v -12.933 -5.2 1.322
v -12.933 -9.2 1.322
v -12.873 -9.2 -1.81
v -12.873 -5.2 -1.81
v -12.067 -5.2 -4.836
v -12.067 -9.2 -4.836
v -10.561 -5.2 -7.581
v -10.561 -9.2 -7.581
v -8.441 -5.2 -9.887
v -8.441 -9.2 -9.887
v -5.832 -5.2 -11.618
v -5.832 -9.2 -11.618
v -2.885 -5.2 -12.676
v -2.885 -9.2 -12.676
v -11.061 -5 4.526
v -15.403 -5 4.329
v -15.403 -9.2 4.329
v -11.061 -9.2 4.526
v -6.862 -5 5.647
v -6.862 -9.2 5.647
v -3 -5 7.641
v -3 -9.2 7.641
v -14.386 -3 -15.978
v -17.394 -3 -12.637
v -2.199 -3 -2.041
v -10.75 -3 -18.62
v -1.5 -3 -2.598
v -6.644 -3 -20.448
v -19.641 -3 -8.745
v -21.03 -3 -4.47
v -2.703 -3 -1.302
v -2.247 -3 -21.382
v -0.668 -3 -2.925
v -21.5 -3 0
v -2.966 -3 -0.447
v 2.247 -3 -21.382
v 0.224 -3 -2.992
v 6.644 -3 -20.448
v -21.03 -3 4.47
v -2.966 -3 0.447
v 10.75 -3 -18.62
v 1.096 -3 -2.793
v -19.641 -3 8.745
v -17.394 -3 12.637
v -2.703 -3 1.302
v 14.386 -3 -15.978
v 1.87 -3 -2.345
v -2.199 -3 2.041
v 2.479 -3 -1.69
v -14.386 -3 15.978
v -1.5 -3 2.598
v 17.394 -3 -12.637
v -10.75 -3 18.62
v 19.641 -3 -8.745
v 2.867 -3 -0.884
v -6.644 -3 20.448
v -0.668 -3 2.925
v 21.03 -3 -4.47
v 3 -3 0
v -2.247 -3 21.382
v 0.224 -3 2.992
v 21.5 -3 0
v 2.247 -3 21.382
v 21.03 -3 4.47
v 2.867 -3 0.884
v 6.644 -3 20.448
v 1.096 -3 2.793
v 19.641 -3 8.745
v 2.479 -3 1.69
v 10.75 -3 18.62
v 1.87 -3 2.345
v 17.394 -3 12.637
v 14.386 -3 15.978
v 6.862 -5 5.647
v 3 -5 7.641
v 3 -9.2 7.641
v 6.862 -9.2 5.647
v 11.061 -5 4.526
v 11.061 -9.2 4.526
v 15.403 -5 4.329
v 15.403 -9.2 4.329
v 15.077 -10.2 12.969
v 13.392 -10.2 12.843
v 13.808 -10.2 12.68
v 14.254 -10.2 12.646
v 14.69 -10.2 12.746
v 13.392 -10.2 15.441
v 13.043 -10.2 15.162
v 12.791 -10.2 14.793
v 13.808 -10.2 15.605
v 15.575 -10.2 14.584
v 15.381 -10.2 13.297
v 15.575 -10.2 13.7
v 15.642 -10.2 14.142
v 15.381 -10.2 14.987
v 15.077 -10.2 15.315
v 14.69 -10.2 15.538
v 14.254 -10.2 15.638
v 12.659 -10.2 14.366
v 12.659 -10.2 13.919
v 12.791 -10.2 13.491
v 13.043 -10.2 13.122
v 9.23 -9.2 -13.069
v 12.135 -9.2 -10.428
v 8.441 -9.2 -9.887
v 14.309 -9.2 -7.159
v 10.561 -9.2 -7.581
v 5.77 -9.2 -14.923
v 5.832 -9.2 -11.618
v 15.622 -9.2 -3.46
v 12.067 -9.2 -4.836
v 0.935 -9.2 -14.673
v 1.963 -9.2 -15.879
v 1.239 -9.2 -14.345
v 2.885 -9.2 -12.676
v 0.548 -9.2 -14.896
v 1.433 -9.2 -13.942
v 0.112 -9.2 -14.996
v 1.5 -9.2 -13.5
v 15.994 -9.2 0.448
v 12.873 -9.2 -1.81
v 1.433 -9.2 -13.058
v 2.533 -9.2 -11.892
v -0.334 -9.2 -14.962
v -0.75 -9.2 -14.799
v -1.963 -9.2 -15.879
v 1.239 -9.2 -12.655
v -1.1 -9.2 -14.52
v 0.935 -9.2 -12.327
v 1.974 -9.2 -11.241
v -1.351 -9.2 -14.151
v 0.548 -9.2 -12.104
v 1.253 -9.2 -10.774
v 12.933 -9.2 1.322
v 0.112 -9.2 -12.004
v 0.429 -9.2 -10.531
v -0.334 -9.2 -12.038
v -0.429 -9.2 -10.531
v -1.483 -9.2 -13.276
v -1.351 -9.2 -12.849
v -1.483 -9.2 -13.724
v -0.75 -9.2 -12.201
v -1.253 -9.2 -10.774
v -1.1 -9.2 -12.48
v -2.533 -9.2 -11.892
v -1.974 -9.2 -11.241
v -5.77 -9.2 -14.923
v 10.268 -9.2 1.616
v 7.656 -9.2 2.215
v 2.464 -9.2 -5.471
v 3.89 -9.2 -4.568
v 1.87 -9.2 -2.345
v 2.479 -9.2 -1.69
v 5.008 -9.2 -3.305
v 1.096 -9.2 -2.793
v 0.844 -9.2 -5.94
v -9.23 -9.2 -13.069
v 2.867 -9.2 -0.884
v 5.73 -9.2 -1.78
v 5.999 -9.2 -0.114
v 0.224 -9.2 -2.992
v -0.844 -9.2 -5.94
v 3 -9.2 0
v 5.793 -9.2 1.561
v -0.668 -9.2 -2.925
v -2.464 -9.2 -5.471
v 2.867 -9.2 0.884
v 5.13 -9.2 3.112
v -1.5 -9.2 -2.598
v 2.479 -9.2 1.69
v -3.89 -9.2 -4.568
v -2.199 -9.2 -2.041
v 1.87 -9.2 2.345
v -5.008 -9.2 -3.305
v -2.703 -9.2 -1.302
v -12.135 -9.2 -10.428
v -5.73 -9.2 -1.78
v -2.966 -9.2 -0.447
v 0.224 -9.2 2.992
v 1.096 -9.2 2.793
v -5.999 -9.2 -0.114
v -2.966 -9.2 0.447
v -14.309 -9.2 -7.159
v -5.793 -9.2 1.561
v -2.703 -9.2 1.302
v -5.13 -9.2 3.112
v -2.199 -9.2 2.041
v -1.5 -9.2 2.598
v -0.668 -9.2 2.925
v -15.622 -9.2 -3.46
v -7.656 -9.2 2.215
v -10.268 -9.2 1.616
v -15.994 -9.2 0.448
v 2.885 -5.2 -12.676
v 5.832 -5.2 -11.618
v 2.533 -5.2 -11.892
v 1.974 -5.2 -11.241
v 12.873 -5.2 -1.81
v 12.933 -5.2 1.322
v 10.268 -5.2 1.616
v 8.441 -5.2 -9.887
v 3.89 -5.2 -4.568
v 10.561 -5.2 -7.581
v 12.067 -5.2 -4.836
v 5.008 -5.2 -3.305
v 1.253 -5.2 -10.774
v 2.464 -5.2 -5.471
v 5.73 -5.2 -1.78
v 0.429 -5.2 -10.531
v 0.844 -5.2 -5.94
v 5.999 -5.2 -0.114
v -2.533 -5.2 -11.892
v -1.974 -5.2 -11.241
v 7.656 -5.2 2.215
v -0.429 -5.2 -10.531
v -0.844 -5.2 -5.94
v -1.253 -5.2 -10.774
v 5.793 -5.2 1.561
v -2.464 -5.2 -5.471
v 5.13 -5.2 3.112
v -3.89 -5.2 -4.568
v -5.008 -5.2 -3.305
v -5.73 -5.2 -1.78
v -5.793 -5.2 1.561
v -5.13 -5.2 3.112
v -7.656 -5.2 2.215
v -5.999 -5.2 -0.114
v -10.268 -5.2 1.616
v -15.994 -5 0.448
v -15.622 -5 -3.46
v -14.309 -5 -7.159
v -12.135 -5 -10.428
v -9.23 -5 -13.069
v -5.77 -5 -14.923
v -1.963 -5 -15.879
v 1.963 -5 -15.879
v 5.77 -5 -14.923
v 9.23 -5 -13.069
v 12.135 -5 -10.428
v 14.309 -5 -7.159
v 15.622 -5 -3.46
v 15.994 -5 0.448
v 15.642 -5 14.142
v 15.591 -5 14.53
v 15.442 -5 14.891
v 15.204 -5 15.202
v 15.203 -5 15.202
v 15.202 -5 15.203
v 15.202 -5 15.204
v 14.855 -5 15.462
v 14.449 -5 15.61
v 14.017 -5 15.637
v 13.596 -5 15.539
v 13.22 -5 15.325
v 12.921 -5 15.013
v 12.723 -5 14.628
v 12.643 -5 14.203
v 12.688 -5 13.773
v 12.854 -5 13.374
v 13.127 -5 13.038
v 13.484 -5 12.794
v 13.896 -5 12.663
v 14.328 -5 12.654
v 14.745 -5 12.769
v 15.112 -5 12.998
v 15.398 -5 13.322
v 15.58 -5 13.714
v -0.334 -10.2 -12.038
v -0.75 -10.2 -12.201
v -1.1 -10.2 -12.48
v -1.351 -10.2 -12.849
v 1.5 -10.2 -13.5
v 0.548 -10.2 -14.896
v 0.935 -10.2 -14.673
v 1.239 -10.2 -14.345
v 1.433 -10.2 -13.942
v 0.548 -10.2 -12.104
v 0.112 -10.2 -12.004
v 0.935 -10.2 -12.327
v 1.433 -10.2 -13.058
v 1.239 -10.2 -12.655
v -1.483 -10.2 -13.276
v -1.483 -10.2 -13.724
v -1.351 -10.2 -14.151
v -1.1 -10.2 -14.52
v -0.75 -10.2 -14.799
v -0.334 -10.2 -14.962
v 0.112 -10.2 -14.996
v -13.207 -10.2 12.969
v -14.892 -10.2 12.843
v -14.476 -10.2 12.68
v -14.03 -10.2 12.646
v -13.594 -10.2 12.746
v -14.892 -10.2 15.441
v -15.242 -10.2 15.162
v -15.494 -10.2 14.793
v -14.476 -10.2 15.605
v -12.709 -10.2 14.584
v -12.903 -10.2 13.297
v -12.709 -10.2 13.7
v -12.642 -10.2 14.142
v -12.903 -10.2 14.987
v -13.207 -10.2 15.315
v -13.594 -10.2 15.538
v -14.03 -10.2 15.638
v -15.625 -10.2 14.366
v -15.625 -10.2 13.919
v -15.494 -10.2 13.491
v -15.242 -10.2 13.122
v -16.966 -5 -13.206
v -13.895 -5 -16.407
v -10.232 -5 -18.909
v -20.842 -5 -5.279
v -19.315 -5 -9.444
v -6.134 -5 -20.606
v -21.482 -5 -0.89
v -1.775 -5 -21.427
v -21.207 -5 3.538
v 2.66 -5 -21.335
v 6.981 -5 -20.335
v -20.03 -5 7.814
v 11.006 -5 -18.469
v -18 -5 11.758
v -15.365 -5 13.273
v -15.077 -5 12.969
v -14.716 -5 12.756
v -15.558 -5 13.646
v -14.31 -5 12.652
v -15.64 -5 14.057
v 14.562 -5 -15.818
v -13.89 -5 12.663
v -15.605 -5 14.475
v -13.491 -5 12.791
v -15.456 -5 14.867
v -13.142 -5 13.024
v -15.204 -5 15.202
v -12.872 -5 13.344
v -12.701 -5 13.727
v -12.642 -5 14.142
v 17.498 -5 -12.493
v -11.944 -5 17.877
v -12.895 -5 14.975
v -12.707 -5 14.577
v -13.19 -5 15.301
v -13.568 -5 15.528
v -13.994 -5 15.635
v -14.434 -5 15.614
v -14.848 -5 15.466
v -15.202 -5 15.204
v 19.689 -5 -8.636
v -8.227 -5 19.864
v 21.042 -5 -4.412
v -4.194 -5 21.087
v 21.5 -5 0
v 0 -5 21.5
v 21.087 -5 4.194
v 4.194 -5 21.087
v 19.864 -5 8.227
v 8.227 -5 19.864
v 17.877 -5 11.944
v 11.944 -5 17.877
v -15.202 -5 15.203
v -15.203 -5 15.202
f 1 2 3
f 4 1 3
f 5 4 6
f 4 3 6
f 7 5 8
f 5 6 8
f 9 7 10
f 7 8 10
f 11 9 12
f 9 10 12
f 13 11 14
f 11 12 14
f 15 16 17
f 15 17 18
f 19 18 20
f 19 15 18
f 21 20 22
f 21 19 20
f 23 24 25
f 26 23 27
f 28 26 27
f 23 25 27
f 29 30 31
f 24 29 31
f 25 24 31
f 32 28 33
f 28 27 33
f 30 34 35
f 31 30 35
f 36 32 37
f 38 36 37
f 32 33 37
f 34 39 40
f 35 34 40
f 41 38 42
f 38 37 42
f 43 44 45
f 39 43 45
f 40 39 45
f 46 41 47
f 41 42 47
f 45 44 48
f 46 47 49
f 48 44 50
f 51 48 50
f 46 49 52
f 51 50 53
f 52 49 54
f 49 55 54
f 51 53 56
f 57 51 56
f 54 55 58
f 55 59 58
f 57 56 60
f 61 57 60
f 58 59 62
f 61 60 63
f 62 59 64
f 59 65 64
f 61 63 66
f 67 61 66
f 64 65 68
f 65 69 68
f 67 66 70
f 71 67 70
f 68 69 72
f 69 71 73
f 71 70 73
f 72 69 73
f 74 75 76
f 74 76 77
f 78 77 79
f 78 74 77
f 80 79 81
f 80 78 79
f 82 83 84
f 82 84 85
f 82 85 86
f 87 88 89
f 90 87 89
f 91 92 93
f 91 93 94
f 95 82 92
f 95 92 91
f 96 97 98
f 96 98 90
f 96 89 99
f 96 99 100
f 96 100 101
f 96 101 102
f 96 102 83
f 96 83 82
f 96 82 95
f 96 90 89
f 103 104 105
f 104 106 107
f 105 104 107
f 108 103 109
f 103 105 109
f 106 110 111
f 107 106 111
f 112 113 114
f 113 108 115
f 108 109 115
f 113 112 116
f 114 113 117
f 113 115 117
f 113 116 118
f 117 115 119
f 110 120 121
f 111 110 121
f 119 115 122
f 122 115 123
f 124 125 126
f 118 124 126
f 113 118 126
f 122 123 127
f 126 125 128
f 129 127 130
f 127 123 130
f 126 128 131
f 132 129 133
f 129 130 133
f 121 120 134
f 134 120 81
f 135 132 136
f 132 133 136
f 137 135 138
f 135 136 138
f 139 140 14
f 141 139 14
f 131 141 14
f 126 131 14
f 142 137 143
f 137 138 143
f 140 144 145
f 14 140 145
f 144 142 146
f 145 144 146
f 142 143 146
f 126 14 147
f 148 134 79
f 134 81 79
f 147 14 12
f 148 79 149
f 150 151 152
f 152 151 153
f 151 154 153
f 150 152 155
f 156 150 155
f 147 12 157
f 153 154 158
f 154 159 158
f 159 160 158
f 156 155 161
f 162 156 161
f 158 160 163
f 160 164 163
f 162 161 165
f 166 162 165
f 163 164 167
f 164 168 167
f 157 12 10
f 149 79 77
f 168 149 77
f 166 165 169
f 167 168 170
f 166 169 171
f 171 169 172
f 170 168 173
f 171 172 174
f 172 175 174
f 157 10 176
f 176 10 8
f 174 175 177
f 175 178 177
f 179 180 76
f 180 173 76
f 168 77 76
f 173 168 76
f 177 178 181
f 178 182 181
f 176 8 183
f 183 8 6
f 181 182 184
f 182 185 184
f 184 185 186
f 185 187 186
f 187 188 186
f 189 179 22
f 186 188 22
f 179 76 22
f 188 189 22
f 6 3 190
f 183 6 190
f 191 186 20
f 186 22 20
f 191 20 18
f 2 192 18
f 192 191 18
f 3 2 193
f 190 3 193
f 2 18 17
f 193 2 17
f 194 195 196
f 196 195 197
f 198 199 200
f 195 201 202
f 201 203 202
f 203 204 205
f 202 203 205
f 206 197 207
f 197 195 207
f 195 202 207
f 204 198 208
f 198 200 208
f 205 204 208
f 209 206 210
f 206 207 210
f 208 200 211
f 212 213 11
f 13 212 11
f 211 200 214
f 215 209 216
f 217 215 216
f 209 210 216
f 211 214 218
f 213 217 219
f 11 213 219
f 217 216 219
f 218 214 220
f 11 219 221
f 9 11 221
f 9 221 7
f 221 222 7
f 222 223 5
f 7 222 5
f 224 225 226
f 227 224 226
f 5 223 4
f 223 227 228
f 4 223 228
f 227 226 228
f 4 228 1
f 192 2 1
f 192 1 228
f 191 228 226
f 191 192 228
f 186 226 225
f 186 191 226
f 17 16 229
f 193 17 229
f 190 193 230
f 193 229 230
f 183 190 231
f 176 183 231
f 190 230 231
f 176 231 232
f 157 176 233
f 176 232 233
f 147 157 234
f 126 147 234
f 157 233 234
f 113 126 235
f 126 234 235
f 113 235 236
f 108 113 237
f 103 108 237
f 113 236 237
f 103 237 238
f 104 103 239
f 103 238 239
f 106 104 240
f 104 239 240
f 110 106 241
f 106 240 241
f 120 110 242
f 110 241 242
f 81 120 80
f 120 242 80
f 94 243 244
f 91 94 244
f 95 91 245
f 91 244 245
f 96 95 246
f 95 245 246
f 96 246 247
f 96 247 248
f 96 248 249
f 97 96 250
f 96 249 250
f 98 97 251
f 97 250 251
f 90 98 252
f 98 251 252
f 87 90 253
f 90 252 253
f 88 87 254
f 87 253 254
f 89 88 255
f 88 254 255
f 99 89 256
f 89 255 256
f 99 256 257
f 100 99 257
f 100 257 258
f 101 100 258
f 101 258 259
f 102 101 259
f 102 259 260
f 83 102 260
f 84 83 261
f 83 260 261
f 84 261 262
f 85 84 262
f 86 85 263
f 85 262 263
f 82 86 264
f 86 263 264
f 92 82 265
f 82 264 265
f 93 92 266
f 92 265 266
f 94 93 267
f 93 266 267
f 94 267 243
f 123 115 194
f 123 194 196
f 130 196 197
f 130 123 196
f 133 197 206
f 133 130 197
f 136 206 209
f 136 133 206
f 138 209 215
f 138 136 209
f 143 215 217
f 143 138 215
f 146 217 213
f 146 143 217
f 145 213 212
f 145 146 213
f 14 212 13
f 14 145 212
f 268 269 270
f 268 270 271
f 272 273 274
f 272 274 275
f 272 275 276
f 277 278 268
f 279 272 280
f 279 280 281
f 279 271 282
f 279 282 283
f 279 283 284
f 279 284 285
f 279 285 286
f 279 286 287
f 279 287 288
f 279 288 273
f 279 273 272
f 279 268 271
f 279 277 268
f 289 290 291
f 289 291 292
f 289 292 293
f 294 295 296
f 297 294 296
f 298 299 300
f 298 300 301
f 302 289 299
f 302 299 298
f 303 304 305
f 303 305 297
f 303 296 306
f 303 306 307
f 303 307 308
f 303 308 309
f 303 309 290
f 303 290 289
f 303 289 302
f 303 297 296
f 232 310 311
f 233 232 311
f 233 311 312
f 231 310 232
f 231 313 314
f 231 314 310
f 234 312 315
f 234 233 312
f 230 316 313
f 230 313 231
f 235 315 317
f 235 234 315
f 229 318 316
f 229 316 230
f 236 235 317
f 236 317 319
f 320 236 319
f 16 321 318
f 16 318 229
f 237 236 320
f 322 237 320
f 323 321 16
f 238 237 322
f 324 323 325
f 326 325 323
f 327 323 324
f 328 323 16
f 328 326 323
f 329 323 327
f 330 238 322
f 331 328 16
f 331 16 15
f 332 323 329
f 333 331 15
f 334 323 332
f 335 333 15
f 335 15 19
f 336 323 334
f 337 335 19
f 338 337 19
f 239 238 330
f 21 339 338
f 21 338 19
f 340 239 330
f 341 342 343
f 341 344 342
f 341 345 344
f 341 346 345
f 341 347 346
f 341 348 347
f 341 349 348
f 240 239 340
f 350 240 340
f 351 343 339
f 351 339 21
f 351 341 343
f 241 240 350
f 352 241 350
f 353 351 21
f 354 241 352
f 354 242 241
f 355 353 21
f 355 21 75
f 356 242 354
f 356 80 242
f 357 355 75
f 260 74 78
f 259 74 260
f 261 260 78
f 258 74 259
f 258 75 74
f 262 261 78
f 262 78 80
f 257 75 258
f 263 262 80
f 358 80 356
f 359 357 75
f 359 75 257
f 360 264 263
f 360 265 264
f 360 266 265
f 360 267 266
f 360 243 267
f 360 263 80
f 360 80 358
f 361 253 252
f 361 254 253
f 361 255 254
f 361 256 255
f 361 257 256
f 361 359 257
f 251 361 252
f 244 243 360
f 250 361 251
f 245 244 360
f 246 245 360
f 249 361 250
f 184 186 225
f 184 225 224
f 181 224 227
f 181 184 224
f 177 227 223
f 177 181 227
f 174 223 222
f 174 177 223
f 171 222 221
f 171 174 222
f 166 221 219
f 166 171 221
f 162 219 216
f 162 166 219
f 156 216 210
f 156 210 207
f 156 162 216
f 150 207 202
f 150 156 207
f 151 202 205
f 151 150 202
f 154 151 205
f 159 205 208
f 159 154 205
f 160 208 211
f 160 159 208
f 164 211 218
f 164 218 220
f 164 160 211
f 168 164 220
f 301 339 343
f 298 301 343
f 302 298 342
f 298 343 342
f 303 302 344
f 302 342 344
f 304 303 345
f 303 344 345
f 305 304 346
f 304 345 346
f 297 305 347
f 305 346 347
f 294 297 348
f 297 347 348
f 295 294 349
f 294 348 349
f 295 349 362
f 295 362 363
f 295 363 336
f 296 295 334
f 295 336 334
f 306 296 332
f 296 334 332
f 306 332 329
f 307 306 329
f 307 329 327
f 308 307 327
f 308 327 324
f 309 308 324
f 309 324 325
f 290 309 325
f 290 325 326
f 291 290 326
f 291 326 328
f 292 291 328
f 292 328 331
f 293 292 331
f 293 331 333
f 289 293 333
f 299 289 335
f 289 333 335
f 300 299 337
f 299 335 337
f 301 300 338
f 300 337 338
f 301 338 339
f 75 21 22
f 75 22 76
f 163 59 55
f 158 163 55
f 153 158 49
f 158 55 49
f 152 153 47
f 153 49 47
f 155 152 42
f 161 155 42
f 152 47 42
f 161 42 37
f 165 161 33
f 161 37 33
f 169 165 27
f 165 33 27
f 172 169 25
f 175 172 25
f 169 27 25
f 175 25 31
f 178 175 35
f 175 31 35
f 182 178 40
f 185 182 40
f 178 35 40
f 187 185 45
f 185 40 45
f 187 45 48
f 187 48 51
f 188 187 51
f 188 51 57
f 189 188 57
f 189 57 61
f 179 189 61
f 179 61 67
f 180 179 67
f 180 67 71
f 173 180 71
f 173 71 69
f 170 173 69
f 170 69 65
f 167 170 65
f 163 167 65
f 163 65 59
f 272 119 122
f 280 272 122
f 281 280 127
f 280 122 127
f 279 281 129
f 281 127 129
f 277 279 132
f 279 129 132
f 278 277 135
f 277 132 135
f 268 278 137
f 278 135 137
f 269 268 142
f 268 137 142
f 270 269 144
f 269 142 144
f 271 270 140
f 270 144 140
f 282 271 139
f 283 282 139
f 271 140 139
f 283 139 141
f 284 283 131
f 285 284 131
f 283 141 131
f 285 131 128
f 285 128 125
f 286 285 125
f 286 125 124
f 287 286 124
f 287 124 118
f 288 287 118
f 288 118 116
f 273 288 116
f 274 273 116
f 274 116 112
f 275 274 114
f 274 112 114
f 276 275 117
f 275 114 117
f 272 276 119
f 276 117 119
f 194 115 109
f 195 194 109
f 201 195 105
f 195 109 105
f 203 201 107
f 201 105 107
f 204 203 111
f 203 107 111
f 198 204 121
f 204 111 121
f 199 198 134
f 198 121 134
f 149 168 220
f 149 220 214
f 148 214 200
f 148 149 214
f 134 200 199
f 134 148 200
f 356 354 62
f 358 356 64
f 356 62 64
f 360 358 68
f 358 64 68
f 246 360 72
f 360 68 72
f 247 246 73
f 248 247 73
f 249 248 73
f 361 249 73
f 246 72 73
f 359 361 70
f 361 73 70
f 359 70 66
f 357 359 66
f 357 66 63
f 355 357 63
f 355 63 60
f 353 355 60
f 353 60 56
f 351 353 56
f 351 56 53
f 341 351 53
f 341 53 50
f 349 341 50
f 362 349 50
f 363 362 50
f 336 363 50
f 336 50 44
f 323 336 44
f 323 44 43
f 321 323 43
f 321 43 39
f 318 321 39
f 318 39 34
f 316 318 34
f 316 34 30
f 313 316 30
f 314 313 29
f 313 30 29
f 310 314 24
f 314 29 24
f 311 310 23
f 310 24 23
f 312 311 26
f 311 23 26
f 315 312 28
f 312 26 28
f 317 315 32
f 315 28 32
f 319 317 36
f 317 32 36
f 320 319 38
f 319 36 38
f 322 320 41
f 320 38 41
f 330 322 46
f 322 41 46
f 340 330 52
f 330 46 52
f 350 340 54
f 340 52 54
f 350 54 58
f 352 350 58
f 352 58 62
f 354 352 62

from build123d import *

# Parameters (mm, degrees)
SKETCH_R        = 21.5
PAD_DEPTH       = 2
SKETCH031_R     = 1.5
PAD015_DEPTH    = 5.2
PAD016_DEPTH    = 4.2
SKETCH032_R     = 1.5
PAD017_DEPTH    = 1
POCKET018_DEPTH = 4
SKETCH036_R     = 3
POCKET019_DEPTH = 7.201
SKETCH038_R     = 3
POCKET022_DEPTH = 7.201


with BuildPart() as part:
    # Sketch → Pad (new body)
    with BuildSketch(Plane.XZ):
        Circle(SKETCH_R)
    extrude(amount=PAD_DEPTH)

    # Sketch031 (on Face3 of Pad) → Pad015 (join)
    with BuildSketch(Plane.XZ.offset(2)):
        with Locations((-14.142136, 14.142136)):
            Circle(SKETCH031_R)
        with Locations((14.142136, 14.142136)):
            Circle(SKETCH031_R)
    extrude(amount=PAD015_DEPTH)

    # Sketch017 (on Face3 of Pad) → Pad016 (join)
    with BuildSketch(Plane.XZ.offset(2)):
        with BuildLine():
            ThreePointArc((-15.403137, 4.329363), (-8.931504, 4.97358), (-3, 7.640846))
            Line((-3, 7.640846), (3, 7.640846))
            ThreePointArc((3, 7.640846), (8.931504, 4.97358), (15.403137, 4.329363))
            ThreePointArc((-15.403137, 4.329363), (0, -16), (15.403137, 4.329363))
        make_face()
    extrude(amount=PAD016_DEPTH)

    # Sketch032 (on Face11 of Pad016) → Pad017 (join)
    with BuildSketch(Plane.XZ.offset(6.2)):
        with Locations((0, -13.5)):
            Circle(SKETCH032_R)
    extrude(amount=PAD017_DEPTH)

    # Sketch035 (on Face11 of Pad017) → Pocket018 (cut)
    with BuildSketch(Plane.XZ.offset(6.2)):
        with BuildLine():
            ThreePointArc((-12.932656, 1.321513), (-8.953461, 1.877631), (-5.129887, 3.111954))
            ThreePointArc((-5.129887, 3.111954), (0, -6), (5.129887, 3.111954))
            ThreePointArc((5.129887, 3.111954), (8.953461, 1.877631), (12.932656, 1.321513))
            ThreePointArc((2.884597, -12.675926), (10.560703, -7.580999), (12.932656, 1.321513))
            ThreePointArc((2.884597, -12.675926), (0, -10.5), (-2.884597, -12.675926))
            ThreePointArc((-12.932656, 1.321513), (-10.560703, -7.580999), (-2.884597, -12.675926))
        make_face()
    extrude(amount=-POCKET018_DEPTH, mode=Mode.SUBTRACT)

    # Sketch036 (on Face2 of Pocket018) → Pocket019 (cut, through all)
    with BuildSketch(Plane(origin=(0, 0, 0), x_dir=(1, 0, 0), z_dir=(0, 1, 0))):
        Circle(SKETCH036_R)
    extrude(amount=-POCKET019_DEPTH, mode=Mode.SUBTRACT)

    # Sketch038 (on Face2 of Pad016) → Pocket022 (cut, through all)
    with BuildSketch(Plane(origin=(0, 0, 0), x_dir=(1, 0, 0), z_dir=(0, 1, 0))):
        Circle(SKETCH038_R)
    extrude(amount=-POCKET022_DEPTH, mode=Mode.SUBTRACT)


with BuildPart() as part_1:
    # Body placement: moved
    add(part.part.moved(Location((0, -3, 0))))


solid = part_1.part
